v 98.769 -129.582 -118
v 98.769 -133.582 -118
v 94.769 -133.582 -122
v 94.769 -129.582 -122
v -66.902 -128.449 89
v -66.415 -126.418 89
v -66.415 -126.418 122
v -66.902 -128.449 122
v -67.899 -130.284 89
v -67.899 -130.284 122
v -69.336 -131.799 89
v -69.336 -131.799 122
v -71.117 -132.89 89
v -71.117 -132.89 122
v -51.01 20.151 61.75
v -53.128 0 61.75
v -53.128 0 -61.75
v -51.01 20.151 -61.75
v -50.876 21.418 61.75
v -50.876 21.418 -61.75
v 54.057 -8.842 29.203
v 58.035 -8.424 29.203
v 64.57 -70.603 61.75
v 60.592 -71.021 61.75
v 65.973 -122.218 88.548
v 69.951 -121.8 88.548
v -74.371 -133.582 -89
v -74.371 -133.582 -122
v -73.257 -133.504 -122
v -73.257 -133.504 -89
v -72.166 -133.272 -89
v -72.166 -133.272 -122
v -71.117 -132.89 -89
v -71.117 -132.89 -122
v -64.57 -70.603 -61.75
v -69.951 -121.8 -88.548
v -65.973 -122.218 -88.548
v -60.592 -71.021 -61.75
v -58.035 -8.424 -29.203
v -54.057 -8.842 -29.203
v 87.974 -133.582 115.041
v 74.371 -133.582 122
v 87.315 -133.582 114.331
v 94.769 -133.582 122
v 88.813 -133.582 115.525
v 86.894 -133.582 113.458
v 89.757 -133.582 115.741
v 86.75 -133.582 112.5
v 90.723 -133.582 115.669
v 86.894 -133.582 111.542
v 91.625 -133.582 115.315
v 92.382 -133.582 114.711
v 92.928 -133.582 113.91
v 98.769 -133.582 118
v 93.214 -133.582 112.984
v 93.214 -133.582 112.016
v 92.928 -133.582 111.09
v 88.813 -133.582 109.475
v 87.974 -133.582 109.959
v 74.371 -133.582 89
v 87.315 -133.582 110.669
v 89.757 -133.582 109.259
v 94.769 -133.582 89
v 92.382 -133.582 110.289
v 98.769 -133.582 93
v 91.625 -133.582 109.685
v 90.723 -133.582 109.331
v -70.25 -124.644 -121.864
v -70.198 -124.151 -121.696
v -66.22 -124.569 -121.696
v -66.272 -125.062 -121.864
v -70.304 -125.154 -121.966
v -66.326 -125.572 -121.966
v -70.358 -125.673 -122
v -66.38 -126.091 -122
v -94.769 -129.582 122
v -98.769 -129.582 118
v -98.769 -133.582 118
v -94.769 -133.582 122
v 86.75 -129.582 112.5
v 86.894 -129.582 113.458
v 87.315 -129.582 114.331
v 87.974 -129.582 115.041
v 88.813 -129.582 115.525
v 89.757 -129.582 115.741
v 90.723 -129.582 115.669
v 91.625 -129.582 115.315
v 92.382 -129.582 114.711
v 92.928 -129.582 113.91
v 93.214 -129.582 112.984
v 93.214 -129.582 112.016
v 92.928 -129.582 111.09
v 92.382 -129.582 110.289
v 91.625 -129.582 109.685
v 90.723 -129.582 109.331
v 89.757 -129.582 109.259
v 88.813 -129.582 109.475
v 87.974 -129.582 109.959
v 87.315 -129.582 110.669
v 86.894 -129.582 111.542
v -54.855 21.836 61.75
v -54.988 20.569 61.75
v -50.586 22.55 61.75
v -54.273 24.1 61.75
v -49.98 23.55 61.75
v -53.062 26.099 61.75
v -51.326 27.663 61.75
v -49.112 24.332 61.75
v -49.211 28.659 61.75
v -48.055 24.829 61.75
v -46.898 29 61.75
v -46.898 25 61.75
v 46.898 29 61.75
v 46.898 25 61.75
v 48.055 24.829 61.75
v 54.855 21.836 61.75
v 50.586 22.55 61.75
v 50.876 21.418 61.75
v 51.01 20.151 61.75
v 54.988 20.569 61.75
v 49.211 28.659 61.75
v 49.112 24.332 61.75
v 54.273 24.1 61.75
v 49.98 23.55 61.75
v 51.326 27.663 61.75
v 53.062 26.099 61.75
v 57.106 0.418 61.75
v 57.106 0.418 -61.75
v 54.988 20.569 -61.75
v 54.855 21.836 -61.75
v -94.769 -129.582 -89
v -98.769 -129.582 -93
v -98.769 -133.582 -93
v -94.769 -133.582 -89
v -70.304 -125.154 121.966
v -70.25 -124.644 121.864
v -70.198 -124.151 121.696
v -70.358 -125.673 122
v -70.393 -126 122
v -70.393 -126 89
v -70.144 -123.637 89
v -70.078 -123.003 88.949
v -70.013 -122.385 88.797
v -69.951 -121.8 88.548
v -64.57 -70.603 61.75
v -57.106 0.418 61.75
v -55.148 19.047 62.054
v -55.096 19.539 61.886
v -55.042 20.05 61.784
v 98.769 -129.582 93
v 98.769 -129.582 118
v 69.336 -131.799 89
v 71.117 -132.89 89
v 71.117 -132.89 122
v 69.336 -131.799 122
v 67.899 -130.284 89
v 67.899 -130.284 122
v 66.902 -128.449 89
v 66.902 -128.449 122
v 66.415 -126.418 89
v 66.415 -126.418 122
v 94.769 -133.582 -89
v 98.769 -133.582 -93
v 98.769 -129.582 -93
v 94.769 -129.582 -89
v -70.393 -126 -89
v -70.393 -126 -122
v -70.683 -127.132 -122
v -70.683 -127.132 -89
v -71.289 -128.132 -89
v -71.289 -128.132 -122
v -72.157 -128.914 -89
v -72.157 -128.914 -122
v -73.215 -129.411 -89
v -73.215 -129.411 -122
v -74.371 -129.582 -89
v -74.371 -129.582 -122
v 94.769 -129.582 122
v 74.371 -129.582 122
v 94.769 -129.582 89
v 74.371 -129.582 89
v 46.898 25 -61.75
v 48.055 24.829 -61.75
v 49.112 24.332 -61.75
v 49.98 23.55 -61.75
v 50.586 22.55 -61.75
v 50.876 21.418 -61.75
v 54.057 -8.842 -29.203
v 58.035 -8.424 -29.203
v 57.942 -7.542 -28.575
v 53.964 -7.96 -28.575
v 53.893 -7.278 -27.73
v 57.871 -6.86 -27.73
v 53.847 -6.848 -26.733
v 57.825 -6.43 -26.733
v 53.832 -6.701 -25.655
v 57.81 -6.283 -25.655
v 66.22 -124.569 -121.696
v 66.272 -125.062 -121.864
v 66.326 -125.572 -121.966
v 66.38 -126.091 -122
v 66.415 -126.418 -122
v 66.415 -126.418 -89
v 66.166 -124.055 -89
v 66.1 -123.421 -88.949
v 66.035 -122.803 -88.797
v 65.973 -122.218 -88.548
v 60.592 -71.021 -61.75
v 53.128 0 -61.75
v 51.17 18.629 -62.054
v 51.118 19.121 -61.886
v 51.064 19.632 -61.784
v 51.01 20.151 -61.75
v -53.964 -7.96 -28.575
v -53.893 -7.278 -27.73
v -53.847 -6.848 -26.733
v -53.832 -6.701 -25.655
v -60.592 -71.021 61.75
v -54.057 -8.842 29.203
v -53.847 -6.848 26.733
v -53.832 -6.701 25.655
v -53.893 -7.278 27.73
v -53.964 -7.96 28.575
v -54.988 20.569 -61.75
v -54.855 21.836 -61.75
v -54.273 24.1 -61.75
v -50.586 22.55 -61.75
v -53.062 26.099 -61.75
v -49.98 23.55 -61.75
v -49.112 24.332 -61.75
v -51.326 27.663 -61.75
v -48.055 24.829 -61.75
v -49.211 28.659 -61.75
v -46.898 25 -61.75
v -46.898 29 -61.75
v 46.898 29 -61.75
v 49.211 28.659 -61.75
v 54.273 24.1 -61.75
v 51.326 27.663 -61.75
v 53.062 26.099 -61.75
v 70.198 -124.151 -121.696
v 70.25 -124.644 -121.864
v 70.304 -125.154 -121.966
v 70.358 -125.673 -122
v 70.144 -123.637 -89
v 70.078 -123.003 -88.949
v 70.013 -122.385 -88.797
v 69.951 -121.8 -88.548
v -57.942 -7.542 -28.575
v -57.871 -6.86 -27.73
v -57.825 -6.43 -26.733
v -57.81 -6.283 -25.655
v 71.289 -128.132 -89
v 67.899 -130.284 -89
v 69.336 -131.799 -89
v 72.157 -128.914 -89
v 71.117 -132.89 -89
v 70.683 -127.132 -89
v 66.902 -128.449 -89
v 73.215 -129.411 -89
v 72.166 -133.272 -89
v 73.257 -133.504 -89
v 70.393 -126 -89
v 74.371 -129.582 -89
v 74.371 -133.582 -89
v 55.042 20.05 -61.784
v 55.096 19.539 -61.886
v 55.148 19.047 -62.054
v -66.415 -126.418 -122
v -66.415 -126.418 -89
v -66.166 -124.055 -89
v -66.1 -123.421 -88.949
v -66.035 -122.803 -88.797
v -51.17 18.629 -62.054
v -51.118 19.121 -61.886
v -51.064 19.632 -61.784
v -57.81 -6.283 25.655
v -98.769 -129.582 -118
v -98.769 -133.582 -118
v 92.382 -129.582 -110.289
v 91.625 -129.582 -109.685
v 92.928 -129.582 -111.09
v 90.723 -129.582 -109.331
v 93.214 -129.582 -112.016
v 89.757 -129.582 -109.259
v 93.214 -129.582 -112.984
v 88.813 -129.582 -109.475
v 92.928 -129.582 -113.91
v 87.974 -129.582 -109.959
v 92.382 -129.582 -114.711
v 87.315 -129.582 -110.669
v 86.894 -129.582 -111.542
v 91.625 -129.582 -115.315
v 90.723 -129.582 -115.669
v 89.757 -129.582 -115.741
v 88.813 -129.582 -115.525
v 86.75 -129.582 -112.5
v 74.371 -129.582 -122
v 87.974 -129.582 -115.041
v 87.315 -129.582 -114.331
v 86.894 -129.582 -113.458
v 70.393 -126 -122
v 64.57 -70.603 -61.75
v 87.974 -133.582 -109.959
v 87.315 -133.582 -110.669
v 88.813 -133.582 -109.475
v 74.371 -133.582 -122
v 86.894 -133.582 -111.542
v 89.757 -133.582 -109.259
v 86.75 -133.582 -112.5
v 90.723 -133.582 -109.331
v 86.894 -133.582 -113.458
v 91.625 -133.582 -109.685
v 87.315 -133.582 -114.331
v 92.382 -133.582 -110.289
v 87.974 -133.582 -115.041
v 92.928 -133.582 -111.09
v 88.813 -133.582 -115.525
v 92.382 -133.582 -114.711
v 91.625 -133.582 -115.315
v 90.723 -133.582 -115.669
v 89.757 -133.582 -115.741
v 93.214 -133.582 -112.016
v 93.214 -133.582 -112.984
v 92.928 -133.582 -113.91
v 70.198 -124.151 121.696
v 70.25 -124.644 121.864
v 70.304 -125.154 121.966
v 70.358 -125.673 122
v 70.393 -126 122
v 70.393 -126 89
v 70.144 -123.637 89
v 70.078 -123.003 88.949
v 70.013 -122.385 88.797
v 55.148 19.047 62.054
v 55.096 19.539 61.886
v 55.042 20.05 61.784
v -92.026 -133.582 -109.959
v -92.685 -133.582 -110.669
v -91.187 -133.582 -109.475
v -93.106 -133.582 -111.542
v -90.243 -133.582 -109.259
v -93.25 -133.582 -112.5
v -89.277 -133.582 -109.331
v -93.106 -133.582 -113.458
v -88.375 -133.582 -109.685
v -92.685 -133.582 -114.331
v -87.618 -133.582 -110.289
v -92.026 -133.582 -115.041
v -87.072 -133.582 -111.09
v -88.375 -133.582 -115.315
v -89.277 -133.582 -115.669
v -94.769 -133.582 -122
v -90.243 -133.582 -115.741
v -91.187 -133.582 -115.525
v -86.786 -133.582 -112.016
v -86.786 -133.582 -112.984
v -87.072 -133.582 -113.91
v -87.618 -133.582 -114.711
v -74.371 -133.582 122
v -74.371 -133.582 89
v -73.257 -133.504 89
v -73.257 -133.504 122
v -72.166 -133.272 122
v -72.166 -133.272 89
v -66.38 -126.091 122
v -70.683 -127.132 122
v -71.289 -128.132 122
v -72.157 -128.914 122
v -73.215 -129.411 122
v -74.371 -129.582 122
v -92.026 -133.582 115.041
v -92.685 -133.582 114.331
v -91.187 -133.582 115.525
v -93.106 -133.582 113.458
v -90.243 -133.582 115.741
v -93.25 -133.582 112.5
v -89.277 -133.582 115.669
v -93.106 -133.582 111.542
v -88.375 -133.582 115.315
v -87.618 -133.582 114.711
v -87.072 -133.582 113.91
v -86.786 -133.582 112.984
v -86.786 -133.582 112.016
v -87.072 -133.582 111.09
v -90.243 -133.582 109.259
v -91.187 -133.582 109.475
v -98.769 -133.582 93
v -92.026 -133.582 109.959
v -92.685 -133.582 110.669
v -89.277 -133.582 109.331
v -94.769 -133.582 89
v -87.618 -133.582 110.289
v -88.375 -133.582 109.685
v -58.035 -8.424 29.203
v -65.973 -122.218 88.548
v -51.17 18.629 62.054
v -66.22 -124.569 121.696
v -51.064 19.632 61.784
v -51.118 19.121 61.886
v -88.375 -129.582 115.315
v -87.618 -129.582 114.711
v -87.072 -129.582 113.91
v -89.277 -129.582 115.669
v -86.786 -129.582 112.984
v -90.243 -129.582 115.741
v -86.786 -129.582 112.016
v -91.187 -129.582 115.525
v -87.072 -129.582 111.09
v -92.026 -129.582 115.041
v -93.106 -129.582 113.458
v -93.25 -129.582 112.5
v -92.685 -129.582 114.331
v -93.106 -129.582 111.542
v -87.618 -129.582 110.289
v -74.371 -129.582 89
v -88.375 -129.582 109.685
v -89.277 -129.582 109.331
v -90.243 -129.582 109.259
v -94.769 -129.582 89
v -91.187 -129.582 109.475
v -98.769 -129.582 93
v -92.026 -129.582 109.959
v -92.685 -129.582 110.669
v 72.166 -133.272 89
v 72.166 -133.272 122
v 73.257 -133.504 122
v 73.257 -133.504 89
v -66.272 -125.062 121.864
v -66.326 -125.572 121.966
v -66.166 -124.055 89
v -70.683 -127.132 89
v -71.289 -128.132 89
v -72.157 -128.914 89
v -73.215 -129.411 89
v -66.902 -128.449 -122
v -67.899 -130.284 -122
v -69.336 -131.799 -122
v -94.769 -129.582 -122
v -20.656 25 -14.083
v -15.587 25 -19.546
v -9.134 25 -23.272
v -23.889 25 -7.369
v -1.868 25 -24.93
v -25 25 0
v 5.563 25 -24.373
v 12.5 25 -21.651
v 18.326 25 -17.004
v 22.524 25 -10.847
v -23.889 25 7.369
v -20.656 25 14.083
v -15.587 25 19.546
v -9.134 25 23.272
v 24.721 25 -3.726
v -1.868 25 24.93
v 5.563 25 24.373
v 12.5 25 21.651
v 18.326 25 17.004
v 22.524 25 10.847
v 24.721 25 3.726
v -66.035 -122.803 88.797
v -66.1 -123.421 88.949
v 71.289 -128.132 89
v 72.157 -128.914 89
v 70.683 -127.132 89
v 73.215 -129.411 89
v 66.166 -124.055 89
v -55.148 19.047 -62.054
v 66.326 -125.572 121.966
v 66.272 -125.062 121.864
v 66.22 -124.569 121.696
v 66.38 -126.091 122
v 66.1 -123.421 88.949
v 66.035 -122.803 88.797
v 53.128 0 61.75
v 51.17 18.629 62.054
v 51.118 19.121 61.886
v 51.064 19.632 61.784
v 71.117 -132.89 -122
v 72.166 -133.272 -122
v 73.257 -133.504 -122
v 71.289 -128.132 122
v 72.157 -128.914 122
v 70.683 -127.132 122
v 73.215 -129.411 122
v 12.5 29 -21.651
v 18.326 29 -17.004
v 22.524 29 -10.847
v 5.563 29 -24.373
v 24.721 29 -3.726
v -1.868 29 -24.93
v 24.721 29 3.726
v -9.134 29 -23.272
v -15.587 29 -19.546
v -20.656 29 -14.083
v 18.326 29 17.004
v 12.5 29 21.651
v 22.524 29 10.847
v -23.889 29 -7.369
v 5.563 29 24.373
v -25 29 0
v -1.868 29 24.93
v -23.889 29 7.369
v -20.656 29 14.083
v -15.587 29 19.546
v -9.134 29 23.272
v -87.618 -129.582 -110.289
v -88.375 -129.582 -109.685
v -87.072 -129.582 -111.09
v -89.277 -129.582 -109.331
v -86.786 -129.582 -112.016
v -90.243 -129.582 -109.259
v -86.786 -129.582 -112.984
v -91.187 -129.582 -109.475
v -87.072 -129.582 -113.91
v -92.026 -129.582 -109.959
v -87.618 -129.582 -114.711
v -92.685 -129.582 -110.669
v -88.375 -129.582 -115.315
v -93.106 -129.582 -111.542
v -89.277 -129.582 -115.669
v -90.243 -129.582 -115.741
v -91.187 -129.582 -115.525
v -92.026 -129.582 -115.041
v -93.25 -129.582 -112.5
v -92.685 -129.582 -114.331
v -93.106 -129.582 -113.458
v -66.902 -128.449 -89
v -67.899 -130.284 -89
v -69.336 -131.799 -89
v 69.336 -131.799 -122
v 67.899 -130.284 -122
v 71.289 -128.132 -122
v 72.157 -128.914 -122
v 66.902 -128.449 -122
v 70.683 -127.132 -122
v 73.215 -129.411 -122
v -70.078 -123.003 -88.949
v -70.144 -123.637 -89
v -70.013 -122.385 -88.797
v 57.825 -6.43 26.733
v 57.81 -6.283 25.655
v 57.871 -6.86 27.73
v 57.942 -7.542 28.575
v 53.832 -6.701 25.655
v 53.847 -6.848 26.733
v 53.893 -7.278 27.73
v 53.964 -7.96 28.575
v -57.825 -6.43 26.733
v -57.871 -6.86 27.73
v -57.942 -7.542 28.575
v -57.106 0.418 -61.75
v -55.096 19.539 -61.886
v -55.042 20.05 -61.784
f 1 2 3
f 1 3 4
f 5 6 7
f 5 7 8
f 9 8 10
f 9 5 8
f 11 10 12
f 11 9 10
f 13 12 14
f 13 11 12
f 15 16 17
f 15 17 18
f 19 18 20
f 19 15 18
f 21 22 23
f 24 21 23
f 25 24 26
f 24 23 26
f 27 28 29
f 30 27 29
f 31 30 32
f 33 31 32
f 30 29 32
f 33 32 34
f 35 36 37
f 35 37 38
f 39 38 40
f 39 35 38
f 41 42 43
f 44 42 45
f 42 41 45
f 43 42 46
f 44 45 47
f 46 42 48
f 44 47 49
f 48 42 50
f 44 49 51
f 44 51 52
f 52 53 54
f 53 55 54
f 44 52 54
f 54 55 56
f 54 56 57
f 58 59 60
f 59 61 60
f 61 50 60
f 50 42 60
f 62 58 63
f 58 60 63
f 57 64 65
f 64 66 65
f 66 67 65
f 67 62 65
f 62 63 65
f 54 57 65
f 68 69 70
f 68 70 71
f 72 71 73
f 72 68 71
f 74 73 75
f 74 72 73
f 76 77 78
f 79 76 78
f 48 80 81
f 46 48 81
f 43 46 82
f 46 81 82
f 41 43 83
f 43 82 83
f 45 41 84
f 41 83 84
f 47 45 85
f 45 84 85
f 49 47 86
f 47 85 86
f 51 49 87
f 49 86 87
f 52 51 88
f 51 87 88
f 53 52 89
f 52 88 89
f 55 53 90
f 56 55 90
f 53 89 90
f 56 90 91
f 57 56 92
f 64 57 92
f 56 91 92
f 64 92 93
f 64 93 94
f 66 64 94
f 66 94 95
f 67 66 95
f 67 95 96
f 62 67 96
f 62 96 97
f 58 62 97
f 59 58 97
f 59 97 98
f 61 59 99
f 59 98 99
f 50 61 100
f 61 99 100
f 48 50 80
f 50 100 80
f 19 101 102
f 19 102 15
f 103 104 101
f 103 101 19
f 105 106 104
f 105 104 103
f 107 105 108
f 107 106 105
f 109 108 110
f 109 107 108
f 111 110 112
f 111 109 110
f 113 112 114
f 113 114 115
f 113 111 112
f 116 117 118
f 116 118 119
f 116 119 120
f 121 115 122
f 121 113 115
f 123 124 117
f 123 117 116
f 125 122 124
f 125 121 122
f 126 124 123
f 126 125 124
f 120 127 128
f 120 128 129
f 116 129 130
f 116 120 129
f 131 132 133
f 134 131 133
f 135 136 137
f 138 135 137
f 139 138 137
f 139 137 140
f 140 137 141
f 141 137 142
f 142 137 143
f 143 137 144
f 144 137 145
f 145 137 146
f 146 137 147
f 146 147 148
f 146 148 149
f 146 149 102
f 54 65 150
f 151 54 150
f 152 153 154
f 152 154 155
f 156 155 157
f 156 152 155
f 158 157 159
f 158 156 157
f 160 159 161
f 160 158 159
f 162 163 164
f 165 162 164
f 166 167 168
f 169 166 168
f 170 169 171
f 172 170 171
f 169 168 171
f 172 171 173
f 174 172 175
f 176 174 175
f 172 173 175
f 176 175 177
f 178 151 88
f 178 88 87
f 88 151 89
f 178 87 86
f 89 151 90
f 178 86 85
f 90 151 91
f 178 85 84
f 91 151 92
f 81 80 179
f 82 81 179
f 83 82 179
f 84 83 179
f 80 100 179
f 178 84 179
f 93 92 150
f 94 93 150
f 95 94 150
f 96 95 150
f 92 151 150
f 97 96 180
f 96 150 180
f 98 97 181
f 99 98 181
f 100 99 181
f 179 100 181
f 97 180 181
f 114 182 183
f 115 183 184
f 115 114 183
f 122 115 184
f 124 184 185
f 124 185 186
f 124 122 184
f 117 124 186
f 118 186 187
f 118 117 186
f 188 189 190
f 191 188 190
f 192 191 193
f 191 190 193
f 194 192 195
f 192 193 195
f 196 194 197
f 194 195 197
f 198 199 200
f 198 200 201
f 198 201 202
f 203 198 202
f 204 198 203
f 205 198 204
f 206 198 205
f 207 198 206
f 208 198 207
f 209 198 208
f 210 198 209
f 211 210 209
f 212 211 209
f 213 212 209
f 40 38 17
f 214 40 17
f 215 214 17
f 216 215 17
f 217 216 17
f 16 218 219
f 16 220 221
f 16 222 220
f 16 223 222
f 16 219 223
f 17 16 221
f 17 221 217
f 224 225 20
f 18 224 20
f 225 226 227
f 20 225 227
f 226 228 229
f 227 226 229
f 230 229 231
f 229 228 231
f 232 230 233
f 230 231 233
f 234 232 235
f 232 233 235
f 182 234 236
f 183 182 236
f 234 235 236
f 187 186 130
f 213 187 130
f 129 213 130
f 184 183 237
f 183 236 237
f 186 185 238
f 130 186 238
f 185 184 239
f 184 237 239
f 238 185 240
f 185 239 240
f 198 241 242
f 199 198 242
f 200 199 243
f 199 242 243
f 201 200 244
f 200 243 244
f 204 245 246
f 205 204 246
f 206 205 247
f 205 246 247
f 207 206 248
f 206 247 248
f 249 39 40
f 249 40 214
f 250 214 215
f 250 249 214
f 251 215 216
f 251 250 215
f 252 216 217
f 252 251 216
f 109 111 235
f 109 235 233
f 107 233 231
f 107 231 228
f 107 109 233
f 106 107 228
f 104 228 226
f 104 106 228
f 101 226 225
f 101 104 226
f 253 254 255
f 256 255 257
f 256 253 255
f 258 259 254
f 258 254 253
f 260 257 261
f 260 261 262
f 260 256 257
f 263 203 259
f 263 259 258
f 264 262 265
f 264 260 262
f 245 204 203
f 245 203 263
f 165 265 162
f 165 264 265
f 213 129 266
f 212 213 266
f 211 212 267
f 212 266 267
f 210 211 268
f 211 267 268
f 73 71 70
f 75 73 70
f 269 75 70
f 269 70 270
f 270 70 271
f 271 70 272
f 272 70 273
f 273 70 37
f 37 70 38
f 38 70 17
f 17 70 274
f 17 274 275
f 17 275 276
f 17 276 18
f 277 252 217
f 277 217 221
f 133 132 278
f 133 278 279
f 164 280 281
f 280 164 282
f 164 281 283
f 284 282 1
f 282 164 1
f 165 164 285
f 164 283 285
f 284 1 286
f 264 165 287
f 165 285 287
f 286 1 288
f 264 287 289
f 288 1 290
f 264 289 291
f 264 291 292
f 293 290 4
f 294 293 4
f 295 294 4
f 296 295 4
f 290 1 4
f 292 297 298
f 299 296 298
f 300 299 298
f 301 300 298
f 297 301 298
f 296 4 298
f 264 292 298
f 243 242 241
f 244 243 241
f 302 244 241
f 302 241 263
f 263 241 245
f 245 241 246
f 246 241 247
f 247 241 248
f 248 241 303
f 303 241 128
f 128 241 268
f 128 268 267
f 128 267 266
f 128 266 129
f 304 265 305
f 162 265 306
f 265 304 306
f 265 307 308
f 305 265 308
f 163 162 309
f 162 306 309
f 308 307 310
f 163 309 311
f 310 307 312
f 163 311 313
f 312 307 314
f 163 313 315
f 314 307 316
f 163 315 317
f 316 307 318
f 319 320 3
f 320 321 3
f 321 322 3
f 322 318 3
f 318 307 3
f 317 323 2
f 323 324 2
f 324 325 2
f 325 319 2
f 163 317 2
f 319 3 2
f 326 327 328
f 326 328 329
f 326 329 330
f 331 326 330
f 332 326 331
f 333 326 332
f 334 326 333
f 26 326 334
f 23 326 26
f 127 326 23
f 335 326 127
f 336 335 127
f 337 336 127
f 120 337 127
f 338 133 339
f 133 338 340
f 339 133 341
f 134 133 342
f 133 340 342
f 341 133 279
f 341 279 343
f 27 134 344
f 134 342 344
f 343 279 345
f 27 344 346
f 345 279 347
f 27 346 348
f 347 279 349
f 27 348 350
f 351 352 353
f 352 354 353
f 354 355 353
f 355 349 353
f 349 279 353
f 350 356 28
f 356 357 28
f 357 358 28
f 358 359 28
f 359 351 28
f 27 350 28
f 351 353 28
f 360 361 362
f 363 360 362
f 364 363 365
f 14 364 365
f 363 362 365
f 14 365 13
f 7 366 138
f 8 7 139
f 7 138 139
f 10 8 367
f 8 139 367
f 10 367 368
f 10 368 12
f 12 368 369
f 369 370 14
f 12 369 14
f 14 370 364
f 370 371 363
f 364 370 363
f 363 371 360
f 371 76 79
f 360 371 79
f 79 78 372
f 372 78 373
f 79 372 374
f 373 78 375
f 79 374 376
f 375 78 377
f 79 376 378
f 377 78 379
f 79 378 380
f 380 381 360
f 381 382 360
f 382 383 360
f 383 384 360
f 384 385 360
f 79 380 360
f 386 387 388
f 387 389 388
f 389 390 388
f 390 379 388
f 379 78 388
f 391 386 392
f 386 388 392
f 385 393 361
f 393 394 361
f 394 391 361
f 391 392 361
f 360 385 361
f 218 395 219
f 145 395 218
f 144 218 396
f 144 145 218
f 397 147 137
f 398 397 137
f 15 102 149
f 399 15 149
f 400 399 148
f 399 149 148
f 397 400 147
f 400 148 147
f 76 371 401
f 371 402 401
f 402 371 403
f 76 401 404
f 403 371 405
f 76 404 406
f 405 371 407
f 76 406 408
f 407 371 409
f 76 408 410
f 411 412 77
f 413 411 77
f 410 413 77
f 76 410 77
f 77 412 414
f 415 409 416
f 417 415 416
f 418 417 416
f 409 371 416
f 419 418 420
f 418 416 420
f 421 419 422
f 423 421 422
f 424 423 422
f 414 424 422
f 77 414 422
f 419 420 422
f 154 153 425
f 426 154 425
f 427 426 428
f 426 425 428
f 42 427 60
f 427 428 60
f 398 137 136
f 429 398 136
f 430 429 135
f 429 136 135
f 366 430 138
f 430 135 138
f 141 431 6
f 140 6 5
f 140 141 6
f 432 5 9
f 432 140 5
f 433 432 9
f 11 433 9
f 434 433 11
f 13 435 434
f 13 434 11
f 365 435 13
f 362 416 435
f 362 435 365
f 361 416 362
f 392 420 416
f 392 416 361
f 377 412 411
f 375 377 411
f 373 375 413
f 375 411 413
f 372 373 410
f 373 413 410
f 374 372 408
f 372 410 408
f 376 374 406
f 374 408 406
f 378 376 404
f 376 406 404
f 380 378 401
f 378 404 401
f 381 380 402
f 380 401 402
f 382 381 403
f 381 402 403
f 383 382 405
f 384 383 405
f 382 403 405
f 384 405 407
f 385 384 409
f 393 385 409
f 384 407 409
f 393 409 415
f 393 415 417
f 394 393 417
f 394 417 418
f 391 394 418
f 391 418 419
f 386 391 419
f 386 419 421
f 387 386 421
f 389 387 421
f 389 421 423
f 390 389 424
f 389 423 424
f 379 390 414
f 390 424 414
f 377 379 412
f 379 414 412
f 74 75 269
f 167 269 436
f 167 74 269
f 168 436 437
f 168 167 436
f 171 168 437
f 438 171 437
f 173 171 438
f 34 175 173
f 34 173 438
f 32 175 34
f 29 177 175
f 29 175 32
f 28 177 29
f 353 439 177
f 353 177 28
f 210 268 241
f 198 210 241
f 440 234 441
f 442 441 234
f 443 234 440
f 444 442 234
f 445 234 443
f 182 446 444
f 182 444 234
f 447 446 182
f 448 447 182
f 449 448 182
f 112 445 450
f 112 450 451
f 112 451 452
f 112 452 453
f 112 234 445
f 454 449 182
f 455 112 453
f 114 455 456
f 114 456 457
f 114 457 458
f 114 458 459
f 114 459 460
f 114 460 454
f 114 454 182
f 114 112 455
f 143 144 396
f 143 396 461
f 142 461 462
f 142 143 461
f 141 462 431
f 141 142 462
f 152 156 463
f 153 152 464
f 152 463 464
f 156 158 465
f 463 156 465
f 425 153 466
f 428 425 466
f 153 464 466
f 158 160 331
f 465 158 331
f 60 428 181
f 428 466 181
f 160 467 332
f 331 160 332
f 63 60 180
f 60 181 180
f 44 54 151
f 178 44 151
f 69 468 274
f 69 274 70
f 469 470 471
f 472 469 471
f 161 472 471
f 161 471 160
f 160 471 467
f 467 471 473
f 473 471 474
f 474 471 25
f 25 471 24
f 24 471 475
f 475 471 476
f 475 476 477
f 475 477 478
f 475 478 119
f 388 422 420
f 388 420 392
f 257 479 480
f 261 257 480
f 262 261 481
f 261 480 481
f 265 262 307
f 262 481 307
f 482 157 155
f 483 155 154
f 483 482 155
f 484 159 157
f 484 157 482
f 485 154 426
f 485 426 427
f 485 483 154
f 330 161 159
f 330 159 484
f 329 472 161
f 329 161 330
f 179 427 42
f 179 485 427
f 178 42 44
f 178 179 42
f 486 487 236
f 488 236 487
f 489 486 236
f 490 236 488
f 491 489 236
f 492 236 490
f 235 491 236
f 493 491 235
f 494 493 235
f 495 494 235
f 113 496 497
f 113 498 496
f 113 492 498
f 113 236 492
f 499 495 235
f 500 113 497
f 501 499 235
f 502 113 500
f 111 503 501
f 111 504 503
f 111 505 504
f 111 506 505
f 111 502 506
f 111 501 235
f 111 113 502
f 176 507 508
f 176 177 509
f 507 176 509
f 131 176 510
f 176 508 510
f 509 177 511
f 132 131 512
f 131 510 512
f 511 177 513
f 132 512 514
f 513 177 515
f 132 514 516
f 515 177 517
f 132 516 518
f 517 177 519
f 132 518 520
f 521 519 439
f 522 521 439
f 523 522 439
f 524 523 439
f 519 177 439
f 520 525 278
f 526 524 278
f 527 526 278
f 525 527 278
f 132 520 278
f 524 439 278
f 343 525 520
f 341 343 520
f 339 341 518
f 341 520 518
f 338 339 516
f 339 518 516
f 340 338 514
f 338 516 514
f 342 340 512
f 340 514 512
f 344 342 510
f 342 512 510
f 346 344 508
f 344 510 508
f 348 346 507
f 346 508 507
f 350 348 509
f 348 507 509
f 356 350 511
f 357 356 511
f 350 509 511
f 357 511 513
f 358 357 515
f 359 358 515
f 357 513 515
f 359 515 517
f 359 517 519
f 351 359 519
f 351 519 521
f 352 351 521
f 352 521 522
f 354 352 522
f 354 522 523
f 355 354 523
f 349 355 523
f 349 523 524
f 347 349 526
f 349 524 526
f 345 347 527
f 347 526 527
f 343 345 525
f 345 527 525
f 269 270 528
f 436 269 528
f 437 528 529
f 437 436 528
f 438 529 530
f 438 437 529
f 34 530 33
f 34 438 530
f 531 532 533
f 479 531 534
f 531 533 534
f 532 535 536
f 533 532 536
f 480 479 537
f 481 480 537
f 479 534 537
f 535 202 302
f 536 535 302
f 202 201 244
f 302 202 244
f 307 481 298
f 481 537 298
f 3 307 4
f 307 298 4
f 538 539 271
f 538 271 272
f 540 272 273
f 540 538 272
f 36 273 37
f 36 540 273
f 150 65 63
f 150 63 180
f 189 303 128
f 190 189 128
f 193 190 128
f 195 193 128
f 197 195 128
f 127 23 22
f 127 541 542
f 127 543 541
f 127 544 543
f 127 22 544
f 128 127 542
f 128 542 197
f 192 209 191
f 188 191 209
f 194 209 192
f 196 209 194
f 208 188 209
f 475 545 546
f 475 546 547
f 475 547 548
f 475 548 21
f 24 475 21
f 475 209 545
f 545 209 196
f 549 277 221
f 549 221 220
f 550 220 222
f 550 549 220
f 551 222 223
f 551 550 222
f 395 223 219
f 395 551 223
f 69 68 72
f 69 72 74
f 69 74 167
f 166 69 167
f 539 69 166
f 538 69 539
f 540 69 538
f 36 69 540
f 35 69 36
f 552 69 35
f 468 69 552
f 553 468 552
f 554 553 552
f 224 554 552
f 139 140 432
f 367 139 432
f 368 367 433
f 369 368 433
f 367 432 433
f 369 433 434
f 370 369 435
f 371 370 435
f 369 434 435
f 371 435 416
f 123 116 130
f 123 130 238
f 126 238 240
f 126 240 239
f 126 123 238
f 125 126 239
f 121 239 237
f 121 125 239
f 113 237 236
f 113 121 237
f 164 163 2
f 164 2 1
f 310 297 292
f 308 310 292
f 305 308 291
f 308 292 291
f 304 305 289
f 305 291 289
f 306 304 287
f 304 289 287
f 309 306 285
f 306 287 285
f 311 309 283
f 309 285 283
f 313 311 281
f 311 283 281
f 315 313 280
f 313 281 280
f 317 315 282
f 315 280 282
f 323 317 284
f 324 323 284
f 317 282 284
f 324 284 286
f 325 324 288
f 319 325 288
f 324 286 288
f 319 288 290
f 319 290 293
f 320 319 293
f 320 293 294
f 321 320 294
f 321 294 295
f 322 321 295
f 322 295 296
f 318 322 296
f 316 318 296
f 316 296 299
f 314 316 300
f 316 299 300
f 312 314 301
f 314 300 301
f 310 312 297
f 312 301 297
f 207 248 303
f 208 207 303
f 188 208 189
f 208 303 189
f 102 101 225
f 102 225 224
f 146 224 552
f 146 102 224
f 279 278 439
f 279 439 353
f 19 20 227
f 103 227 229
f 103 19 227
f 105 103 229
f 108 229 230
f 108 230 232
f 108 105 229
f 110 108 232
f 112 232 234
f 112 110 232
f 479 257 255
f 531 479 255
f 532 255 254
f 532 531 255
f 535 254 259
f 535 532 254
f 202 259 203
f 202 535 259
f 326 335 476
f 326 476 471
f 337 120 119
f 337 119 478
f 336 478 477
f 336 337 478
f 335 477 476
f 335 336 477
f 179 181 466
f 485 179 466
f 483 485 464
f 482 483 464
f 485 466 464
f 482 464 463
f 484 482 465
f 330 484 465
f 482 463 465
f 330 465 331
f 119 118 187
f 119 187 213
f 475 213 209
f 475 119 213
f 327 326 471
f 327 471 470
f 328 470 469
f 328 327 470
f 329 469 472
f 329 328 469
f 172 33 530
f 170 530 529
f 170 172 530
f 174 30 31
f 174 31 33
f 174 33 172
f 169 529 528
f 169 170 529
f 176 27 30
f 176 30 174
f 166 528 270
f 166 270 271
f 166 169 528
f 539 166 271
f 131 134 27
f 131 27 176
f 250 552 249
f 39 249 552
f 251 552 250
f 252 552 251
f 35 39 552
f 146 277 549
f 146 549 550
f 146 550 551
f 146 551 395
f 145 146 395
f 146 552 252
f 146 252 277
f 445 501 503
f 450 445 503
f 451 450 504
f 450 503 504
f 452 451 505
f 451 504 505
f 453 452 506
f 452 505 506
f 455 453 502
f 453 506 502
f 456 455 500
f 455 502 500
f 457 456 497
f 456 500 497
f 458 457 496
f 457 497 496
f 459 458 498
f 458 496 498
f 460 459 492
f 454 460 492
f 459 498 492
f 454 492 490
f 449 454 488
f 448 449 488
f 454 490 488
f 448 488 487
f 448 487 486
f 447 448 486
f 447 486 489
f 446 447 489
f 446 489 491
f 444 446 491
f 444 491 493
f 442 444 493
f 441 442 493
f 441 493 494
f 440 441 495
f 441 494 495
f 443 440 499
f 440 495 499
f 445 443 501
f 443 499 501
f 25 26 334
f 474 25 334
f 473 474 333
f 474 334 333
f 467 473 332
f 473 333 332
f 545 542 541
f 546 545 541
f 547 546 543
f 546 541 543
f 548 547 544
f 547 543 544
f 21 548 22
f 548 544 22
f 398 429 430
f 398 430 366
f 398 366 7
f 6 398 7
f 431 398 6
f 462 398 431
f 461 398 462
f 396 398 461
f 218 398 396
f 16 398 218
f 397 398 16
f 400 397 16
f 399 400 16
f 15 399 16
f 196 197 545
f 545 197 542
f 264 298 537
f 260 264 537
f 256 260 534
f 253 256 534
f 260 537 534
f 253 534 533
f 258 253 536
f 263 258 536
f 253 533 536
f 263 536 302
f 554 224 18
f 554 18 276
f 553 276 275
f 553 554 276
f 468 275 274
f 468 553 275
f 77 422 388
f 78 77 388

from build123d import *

# Parameters (mm, degrees)
SM_BASE_FLANGE_1_DEPTH   = 61.75
SKETCH_3_R               = 25
CUT_EXTRUDE_1_DEPTH      = 4
EXTRUDE_2_DEPTH          = 4
CUT_EXTRUDE_3_DEPTH      = 4
SM_START                 = -122
SM_EDGE_FLANGE_1_DEPTH   = 244
SM_EDGE_FLANGE_1_2_DEPTH = 33
SM_START_2               = 89
SM_EDGE_FLANGE_1_3_DEPTH = 33
SKETCH_44_R              = 3.25
CUT_EXTRUDE_4_DEPTH      = 4
CHAMFER_1_SIZE           = 4


# Read off the part's stored shape, not the designer's step: Ребро-кромка1
# Sheet-metal steps are written as plain solids
with BuildPart() as part:
    # Sketch 1 → Базовая кромка1 (new, symmetric)
    with BuildSketch(Plane.XY):
        with BuildLine():
            Line((-67.211573407, -134), (-53.127605882, 0))
            Line((-53.127605882, 0), (-50.876471404, 21.418113853))
            ThreePointArc((-50.876471404, 21.418113853), (-49.574906248, 23.972579302), (-46.898383823, 25))
            Line((-46.898383823, 25), (46.898383823, 25))
            ThreePointArc((46.898383823, 25), (49.574906248, 23.972579302), (50.876471404, 21.418113853))
            Line((50.876471404, 21.418113853), (53.127605882, 0))
            Line((53.127605882, 0), (67.211573407, -134))
            Line((67.211573407, -134), (71.189660989, -133.581886147))
            Line((71.189660989, -133.581886147), (57.105693463, 0.418113853))
            Line((57.105693463, 0.418113853), (54.854558986, 21.836227706))
            ThreePointArc((54.854558986, 21.836227706), (52.251428674, 26.945158604), (46.898383823, 29))
            Line((46.898383823, 29), (-46.898383823, 29))
            ThreePointArc((-46.898383823, 29), (-52.251428674, 26.945158604), (-54.854558986, 21.836227706))
            Line((-54.854558986, 21.836227706), (-57.105693463, 0.418113853))
            Line((-57.105693463, 0.418113853), (-71.189660989, -133.581886147))
            Line((-71.189660989, -133.581886147), (-67.211573407, -134))
        make_face()
    extrude(amount=SM_BASE_FLANGE_1_DEPTH, both=True)

    # Эскиз3 → Вытянуть1 (cut)
    with BuildSketch(Plane(origin=(0, 29, 0), x_dir=(1, 0, 0), z_dir=(0, 1, 0))):
        with Locations(Location((0, 0, 0), (0, 0, 180))):
            Circle(SKETCH_3_R)
    extrude(amount=-CUT_EXTRUDE_1_DEPTH, mode=Mode.SUBTRACT)

    # Эскиз33 → Вытянуть2 (add)
    with BuildSketch(Plane(origin=(56.525210635, 5.941039037, 0), x_dir=(0, 0, -1), z_dir=(0.9945218953682734, 0.10452846326765315, 0))):
        with BuildLine():
            Line((-62.05448187, 13.177809809), (-121.69551813, -130.808388804))
            ThreePointArc((-121.69551813, -130.808388804), (-121.923141122, -131.558761245), (-122, -132.339122533))
            Line((-122, -132.339122533), (-122, -140.291456461))
            Line((-122, -140.291456461), (-61.75, -140.291456461))
            Line((-61.75, -140.291456461), (-61.75, 14.708543539))
            ThreePointArc((-61.75, 14.708543539), (-61.826858878, 13.928182251), (-62.05448187, 13.177809809))
        make_face()
        with BuildLine():
            Line((122, -132.339122533), (122, -140.291456461))
            Line((122, -140.291456461), (61.75, -140.291456461))
            Line((61.75, -140.291456461), (61.75, 14.708543539))
            ThreePointArc((61.75, 14.708543539), (61.826858878, 13.928182251), (62.05448187, 13.177809809))
            Line((62.05448187, 13.177809809), (121.69551813, -130.808388804))
            ThreePointArc((121.69551813, -130.808388804), (121.923141122, -131.558761245), (122, -132.339122533))
        make_face()
    extrude_2 = extrude(amount=-EXTRUDE_2_DEPTH)

    # Эскиз39 → Вытянуть3 (cut)
    with BuildSketch(Plane(origin=(56.525210635, 5.941039037, 0), x_dir=(0, 0, -1), z_dir=(0.9945218953682734, 0.10452846326765315, 0))):
        with BuildLine():
            Line((25.655356237, -12.291456461), (-25.655356237, -12.291456461))
            ThreePointArc((-25.655356237, -12.291456461), (-27.73044927, -12.871808979), (-29.20339957, -14.444462008))
            Line((-29.20339957, -14.444462008), (-88.548043333, -128.444462008))
            ThreePointArc((-88.548043333, -128.444462008), (-88.885368279, -129.340712892), (-89, -130.291456461))
            Line((-89, -130.291456461), (-89, -140.291456461))
            Line((-89, -140.291456461), (89, -140.291456461))
            Line((89, -140.291456461), (89, -130.291456461))
            ThreePointArc((89, -130.291456461), (88.885368279, -129.340712892), (88.548043333, -128.444462008))
            Line((88.548043333, -128.444462008), (29.20339957, -14.444462008))
            ThreePointArc((29.20339957, -14.444462008), (27.73044927, -12.871808979), (25.655356237, -12.291456461))
        make_face()
    cut_extrude_3 = extrude(amount=-CUT_EXTRUDE_3_DEPTH, mode=Mode.SUBTRACT)

    # Зеркальное отражение1: Вытянуть2, Вытянуть3 across plane
    add(extrude_2.mirror(Plane(origin=(0, 0, 0), x_dir=(0, 0, 1), z_dir=(1, 0, 0))))
    add(cut_extrude_3.mirror(Plane(origin=(0, 0, 0), x_dir=(0, 0, 1), z_dir=(1, 0, 0))), mode=Mode.SUBTRACT)

    # Ребро-кромка1 outline → Ребро-кромка1 (cut)
    with BuildSketch(Plane.XY.offset(SM_START)):
        with BuildLine():
            Line((71.189660989, -133.581886147), (71.116967081, -132.890249808))
            ThreePointArc((71.116967081, -132.890249808), (67.89872427, -130.284168166), (66.414685062, -126.418113853))
            Line((66.414685062, -126.418113853), (67.211573407, -134))
            Line((67.211573407, -134), (71.189660989, -133.581886147))
        make_face()
        with BuildLine():
            ThreePointArc((-66.414685062, -126.418113853), (-67.89872427, -130.284168166), (-71.116967081, -132.890249808))
            Line((-71.116967081, -132.890249808), (-71.189660989, -133.581886147))
            Line((-71.189660989, -133.581886147), (-67.211573407, -134))
            Line((-67.211573407, -134), (-66.414685062, -126.418113853))
        make_face()
    extrude(amount=SM_EDGE_FLANGE_1_DEPTH, mode=Mode.SUBTRACT)

    # Sm Edge Flange 1 2 outline → Sm Edge Flange 1 2 (add)
    with BuildSketch(Plane.XY.offset(SM_START)):
        with BuildLine():
            ThreePointArc((71.116967081, -132.890249808), (72.707566699, -133.407066953), (74.370860225, -133.581886147))
            Line((74.370860225, -133.581886147), (98.769244048, -133.581886147))
            Line((98.769244048, -133.581886147), (98.769244048, -129.581886147))
            Line((98.769244048, -129.581886147), (74.370860225, -129.581886147))
            ThreePointArc((74.370860225, -129.581886147), (71.694337799, -128.554465449), (70.392772643, -126))
            Line((70.392772643, -126), (71.116967081, -132.890249808))
        make_face()
        with BuildLine():
            Line((-98.769244048, -133.581886147), (-74.370860225, -133.581886147))
            ThreePointArc((-74.370860225, -133.581886147), (-72.707566699, -133.407066953), (-71.116967081, -132.890249808))
            Line((-71.116967081, -132.890249808), (-70.392772643, -126))
            ThreePointArc((-70.392772643, -126), (-71.694337799, -128.554465449), (-74.370860225, -129.581886147))
            Line((-74.370860225, -129.581886147), (-98.769244048, -129.581886147))
            Line((-98.769244048, -129.581886147), (-98.769244048, -133.581886147))
        make_face()
    extrude(amount=SM_EDGE_FLANGE_1_2_DEPTH)

    # Sm Edge Flange 1 3 outline → Sm Edge Flange 1 3 (add)
    with BuildSketch(Plane.XY.offset(SM_START_2)):
        with BuildLine():
            ThreePointArc((71.116967081, -132.890249808), (72.707566699, -133.407066953), (74.370860225, -133.581886147))
            Line((74.370860225, -133.581886147), (98.769244048, -133.581886147))
            Line((98.769244048, -133.581886147), (98.769244048, -129.581886147))
            Line((98.769244048, -129.581886147), (74.370860225, -129.581886147))
            ThreePointArc((74.370860225, -129.581886147), (71.694337799, -128.554465449), (70.392772643, -126))
            Line((70.392772643, -126), (71.116967081, -132.890249808))
        make_face()
        with BuildLine():
            Line((-98.769244048, -133.581886147), (-74.370860225, -133.581886147))
            ThreePointArc((-74.370860225, -133.581886147), (-72.707566699, -133.407066953), (-71.116967081, -132.890249808))
            Line((-71.116967081, -132.890249808), (-70.392772643, -126))
            ThreePointArc((-70.392772643, -126), (-71.694337799, -128.554465449), (-74.370860225, -129.581886147))
            Line((-74.370860225, -129.581886147), (-98.769244048, -129.581886147))
            Line((-98.769244048, -129.581886147), (-98.769244048, -133.581886147))
        make_face()
    extrude(amount=SM_EDGE_FLANGE_1_3_DEPTH)

    # Эскиз44 → Вытянуть4 (cut)
    with BuildSketch(Plane(origin=(0, -129.581886147, 0), x_dir=(1, 0, 0), z_dir=(0, 1, 0))):
        with Locations(Location((90, -112.5, 0), (0, 0, 180))):
            Circle(SKETCH_44_R)
        with Locations(Location((90, 112.5, 0), (0, 0, 180))):
            Circle(SKETCH_44_R)
        with Locations(Location((-90, 112.5, 0), (0, 0, 180))):
            Circle(SKETCH_44_R)
        with Locations(Location((-90, -112.5, 0), (0, 0, 180))):
            Circle(SKETCH_44_R)
    extrude(amount=-CUT_EXTRUDE_4_DEPTH, mode=Mode.SUBTRACT)

    # Фаска1
    chamfer_1_edges = [part.edges().sort_by_distance(p)[0] for p in [
        (98.769244048, -131.581886147, 122),
        (98.769244048, -131.581886147, 89),
        (-98.769244048, -131.581886147, 89),
        (-98.769244048, -131.581886147, 122),
        (98.769244048, -131.581886147, -89),
        (98.769244048, -131.581886147, -122),
        (-98.769244048, -131.581886147, -122),
        (-98.769244048, -131.581886147, -89),
    ]]
    chamfer(chamfer_1_edges, length=CHAMFER_1_SIZE)


solid = part.part
